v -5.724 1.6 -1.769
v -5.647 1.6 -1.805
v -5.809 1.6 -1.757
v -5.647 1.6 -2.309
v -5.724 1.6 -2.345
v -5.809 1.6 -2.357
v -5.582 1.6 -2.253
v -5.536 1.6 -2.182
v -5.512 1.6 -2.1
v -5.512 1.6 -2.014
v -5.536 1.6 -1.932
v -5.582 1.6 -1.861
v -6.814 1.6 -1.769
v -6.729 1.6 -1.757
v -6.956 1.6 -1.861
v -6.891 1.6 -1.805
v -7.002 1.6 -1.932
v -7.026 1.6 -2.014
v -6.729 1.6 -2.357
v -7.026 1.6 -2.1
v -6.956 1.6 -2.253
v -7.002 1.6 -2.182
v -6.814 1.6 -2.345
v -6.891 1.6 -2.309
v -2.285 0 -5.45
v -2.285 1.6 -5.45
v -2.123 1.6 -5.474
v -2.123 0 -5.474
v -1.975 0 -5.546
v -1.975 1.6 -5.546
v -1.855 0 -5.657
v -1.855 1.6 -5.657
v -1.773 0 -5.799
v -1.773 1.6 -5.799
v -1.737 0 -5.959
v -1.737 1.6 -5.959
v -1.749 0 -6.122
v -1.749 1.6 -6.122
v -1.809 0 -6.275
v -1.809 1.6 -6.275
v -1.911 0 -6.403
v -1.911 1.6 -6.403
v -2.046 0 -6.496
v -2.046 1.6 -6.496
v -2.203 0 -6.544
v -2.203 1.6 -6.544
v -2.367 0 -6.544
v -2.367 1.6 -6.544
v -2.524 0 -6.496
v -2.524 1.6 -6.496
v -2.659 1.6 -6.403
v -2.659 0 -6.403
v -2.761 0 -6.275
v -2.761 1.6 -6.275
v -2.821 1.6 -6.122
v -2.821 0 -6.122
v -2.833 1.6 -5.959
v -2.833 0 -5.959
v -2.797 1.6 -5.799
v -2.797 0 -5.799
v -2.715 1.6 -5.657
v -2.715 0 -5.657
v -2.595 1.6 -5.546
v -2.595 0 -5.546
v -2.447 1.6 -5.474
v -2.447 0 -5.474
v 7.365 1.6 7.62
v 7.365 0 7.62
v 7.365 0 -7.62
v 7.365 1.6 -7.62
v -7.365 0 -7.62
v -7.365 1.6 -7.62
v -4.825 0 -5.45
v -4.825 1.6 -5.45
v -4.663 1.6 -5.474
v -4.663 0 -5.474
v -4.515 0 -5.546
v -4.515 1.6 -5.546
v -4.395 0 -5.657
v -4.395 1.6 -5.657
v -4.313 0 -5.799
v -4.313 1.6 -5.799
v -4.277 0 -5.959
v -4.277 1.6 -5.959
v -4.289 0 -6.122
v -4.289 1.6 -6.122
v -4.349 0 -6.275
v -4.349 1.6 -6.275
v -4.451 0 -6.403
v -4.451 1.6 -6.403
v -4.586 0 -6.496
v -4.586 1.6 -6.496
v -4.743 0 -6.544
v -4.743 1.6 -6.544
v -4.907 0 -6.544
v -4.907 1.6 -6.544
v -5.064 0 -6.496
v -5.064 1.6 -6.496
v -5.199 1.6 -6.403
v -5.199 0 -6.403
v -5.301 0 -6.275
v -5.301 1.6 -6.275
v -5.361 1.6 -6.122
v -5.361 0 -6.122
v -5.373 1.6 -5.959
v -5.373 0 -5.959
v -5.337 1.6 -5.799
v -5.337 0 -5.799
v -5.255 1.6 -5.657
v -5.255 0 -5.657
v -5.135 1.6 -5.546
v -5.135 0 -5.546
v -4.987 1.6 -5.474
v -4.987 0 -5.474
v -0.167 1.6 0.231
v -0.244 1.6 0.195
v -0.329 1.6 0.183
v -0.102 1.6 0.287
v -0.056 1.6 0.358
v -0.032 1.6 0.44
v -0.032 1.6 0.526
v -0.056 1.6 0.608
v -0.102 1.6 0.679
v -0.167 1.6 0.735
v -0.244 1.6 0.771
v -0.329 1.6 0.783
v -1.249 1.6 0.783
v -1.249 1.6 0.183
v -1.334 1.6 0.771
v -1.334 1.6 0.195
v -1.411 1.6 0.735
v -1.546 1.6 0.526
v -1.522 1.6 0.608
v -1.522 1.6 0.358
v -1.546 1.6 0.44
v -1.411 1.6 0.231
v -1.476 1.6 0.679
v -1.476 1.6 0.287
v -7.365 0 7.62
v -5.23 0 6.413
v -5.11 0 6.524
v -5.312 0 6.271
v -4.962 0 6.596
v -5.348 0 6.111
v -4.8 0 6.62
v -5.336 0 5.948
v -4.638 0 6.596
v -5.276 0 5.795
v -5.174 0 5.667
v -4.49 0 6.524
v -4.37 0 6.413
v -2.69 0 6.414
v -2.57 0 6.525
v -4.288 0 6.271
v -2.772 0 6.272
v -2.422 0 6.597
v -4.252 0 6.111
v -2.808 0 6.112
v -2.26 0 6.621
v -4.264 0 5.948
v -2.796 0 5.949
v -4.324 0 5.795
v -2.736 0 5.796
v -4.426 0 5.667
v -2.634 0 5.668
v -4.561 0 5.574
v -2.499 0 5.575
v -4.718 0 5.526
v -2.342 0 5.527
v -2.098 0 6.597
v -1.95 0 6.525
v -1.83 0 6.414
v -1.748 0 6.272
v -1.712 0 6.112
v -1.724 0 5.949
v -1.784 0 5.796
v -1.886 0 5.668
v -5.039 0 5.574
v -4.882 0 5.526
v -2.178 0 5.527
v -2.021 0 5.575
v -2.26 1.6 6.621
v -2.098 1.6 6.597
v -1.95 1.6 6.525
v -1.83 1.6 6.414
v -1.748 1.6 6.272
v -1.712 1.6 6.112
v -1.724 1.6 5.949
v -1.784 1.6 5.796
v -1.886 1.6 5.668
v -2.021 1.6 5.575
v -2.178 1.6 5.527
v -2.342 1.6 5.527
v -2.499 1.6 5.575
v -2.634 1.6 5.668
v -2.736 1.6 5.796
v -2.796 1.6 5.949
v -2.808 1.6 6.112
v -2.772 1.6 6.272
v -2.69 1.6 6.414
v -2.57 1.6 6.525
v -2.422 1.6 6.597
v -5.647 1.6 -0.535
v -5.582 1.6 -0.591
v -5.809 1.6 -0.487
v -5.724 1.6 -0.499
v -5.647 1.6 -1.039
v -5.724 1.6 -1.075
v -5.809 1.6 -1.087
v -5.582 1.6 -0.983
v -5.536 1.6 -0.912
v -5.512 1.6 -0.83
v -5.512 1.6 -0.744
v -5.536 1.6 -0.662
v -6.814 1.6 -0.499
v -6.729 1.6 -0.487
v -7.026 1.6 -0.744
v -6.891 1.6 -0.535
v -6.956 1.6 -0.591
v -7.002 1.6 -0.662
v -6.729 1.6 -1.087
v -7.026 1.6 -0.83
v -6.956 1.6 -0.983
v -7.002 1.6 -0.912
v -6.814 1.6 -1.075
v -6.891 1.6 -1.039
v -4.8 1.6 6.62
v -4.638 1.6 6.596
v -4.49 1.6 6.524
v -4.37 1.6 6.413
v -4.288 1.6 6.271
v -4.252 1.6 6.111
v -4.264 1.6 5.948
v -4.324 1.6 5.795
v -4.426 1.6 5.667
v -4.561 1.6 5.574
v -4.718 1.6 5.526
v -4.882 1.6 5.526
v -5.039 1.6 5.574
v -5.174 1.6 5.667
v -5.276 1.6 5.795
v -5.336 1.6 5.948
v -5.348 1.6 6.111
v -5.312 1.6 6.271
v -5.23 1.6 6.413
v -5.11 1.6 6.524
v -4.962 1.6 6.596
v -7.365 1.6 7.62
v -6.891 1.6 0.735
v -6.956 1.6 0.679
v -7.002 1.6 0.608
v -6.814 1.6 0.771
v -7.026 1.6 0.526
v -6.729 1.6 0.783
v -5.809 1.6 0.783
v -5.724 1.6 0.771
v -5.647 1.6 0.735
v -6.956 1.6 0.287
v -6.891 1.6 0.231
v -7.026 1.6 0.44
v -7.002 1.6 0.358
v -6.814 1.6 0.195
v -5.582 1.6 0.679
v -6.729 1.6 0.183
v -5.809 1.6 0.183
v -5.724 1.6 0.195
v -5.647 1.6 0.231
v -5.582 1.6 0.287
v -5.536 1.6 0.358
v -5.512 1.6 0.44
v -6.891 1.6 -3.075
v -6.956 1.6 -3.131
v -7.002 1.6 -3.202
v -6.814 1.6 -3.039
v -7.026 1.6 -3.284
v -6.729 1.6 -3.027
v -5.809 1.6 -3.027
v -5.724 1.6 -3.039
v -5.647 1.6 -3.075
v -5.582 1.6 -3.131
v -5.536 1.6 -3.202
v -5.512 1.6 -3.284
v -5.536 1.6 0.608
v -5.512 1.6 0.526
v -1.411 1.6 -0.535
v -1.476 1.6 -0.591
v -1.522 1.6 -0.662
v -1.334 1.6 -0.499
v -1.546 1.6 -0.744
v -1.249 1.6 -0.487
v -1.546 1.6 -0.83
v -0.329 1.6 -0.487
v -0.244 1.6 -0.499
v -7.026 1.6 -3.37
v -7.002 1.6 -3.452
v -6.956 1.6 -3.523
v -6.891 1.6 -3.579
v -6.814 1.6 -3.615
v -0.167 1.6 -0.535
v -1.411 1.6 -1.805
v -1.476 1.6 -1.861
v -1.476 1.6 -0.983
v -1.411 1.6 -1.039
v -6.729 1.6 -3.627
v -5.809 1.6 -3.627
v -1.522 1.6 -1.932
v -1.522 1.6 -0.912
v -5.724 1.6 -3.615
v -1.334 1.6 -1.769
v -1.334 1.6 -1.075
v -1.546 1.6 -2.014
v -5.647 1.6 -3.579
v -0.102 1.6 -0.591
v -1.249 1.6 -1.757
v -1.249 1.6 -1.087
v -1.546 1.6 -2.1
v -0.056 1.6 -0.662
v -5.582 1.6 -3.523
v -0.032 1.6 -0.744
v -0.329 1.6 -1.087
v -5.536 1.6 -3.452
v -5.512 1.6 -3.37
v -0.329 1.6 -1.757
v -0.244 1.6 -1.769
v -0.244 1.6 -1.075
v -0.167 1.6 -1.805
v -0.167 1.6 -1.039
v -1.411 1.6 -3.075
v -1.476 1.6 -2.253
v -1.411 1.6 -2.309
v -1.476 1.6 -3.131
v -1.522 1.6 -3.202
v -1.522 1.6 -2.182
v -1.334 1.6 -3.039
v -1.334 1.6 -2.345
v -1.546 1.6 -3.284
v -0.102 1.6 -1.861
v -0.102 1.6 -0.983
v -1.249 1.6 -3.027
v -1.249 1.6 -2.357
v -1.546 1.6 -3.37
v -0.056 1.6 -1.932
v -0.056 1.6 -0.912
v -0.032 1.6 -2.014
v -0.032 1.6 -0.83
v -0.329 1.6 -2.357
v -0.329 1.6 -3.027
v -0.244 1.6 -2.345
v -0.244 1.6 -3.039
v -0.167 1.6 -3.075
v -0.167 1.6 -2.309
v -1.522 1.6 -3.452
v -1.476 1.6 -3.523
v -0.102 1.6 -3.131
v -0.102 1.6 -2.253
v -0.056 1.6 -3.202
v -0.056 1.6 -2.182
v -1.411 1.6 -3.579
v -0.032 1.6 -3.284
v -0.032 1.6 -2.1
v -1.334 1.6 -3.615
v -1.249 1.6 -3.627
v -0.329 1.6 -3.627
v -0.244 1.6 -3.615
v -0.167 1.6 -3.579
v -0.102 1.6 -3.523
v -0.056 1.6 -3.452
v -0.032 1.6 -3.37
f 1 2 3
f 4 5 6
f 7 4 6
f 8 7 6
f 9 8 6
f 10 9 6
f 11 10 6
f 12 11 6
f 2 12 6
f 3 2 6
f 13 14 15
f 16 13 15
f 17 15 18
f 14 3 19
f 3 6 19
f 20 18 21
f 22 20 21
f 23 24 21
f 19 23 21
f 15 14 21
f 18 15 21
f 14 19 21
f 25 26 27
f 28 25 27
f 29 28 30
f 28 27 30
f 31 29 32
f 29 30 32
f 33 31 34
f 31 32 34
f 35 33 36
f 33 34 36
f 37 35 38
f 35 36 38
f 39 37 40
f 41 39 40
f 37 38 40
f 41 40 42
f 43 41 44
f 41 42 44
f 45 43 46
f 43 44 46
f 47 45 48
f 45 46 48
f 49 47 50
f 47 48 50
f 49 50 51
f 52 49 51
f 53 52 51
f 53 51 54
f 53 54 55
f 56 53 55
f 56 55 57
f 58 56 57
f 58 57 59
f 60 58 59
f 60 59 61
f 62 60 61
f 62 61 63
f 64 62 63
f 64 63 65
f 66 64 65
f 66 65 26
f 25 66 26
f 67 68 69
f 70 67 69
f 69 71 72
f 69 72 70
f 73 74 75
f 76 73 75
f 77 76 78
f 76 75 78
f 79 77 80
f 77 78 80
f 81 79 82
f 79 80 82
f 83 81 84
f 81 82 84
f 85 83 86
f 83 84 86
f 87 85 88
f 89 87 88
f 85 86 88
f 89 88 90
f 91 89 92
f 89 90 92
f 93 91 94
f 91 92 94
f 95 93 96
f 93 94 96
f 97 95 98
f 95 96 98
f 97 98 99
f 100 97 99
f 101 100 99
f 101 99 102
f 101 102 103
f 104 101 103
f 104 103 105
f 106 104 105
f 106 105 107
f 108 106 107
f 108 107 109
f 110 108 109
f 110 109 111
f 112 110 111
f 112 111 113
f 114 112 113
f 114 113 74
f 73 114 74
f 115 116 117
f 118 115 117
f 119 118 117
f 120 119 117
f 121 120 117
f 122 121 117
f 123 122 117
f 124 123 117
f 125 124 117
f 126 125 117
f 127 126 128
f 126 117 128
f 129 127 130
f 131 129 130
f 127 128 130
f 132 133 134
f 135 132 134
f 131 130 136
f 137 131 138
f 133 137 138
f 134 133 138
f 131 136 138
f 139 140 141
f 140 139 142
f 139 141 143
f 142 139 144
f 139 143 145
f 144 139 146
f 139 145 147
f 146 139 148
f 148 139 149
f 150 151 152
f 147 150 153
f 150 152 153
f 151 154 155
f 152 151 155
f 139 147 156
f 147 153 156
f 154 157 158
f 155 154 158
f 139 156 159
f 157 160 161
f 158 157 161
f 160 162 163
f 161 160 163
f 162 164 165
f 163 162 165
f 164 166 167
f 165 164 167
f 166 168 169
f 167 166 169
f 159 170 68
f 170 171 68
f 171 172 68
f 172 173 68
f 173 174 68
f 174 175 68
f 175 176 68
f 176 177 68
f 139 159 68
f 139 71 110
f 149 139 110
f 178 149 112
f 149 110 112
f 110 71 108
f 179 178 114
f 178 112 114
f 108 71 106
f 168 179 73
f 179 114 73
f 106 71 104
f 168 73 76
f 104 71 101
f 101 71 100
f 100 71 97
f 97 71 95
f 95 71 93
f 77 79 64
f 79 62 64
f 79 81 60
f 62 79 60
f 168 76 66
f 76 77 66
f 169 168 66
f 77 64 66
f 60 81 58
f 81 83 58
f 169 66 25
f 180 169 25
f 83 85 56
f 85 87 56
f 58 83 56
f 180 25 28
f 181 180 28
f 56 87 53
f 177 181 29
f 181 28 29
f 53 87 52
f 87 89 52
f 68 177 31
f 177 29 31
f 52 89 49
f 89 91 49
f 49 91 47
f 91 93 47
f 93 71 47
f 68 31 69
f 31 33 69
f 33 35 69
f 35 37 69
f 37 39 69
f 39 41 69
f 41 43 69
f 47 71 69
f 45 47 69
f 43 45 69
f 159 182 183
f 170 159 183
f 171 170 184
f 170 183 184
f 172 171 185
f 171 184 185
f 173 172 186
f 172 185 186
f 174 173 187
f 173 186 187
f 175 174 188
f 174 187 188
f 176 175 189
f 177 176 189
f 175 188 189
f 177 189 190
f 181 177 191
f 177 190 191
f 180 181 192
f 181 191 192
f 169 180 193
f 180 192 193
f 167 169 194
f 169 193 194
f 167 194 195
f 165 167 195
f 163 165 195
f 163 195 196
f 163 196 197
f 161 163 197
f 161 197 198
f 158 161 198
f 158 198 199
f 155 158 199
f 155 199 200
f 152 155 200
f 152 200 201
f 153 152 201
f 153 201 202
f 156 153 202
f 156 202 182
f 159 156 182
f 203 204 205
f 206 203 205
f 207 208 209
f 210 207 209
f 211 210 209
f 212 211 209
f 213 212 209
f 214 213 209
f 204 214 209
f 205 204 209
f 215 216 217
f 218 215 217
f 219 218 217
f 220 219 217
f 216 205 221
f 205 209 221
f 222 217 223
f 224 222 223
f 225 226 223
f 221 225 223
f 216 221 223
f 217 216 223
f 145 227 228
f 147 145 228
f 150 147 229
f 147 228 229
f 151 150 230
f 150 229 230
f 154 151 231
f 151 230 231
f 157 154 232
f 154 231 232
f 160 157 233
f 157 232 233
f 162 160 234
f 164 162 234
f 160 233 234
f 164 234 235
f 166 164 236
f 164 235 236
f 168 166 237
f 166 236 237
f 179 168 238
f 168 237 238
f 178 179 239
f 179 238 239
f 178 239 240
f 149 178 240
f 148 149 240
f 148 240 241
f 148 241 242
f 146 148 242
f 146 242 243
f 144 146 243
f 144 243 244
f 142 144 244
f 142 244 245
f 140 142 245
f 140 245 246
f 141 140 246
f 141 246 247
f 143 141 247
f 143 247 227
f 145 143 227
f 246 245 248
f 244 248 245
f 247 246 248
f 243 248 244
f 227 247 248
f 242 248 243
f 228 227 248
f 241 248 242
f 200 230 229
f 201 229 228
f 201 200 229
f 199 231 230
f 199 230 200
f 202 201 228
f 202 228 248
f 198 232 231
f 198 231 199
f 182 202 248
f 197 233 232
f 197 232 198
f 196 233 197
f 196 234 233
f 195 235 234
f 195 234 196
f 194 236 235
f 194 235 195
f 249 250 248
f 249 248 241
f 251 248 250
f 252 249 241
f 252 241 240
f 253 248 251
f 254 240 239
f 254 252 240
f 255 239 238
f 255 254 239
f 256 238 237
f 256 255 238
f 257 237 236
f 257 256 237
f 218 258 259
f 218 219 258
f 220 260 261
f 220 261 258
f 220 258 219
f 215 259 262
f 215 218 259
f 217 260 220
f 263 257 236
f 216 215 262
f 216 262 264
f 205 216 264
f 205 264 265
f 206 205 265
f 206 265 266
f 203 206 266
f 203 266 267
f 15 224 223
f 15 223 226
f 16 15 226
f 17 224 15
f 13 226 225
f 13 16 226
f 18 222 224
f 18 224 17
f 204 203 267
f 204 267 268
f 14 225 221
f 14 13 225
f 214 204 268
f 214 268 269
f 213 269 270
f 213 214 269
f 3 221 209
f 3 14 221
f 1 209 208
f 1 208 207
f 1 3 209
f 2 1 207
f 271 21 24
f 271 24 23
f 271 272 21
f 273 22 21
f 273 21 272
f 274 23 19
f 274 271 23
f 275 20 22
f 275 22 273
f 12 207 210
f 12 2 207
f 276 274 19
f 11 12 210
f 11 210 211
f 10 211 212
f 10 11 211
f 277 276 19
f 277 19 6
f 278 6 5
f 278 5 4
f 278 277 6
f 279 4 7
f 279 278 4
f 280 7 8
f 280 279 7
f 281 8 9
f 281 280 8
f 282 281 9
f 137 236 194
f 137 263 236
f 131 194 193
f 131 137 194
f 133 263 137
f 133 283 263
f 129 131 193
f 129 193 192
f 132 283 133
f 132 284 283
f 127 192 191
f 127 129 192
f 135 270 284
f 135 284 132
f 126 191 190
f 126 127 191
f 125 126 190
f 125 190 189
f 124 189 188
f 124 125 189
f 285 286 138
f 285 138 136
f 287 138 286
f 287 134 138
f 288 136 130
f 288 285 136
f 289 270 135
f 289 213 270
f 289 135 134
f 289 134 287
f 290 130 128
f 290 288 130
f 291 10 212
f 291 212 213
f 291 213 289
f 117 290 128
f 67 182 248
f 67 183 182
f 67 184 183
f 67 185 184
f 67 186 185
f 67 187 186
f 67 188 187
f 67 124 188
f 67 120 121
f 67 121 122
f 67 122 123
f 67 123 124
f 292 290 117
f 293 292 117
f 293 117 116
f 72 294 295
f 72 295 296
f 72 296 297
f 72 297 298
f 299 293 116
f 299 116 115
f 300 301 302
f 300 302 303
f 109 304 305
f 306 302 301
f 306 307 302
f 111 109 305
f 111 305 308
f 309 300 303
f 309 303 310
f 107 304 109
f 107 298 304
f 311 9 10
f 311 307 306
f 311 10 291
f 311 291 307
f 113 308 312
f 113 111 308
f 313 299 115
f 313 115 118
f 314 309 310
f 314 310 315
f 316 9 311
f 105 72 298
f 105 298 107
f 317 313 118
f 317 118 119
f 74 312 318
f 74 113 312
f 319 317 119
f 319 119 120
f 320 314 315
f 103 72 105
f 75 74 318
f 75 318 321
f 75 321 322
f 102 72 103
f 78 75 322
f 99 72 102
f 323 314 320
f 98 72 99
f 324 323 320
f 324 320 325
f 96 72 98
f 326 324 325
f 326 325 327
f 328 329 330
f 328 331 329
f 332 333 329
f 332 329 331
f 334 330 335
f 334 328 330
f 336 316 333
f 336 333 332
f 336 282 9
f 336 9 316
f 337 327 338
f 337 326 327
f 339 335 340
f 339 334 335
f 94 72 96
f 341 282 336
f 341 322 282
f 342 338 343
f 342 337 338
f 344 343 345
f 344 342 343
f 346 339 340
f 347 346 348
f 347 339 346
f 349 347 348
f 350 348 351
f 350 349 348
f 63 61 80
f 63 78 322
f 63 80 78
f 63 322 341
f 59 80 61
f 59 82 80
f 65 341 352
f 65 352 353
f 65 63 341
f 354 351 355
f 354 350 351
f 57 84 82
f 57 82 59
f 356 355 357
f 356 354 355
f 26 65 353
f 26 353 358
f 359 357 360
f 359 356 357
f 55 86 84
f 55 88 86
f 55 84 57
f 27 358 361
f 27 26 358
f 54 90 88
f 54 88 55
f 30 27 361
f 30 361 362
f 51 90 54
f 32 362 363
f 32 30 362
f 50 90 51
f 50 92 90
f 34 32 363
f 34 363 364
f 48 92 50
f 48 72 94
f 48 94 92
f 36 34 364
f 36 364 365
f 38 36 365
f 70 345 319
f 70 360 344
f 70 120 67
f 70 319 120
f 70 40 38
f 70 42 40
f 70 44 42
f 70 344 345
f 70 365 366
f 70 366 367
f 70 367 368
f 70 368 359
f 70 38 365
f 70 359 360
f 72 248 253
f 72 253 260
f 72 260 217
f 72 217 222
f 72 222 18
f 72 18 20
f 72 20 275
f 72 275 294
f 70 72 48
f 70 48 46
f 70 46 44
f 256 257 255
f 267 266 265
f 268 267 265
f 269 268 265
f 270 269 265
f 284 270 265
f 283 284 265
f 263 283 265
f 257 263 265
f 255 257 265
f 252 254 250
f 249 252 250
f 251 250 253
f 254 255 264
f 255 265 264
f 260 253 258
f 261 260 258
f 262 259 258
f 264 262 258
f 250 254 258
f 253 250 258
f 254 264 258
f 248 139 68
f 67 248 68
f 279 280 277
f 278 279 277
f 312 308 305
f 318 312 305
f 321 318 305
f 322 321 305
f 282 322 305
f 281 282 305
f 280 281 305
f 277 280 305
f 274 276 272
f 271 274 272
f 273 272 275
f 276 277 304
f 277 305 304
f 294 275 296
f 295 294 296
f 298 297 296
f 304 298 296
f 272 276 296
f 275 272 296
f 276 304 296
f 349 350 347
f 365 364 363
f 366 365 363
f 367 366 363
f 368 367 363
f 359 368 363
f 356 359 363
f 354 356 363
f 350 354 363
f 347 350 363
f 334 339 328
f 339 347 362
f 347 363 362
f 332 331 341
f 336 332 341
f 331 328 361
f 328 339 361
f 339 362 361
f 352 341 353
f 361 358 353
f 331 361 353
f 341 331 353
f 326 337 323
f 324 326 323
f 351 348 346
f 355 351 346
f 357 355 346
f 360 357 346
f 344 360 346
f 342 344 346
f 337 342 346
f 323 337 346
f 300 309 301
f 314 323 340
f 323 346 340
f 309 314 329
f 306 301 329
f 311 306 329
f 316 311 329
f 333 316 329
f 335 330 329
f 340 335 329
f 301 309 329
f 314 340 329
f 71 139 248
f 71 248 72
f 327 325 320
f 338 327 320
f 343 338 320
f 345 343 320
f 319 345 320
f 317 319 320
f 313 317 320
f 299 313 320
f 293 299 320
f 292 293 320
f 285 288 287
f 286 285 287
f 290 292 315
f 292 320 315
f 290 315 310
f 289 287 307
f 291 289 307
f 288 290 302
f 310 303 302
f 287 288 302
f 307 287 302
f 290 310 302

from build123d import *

# Parameters (mm, degrees)
SKETCH_1_W          = 14.73
SKETCH_1_H          = 15.24
EXTRUDE_1_DEPTH     = 1.6
SKETCH_2_R          = 0.55
CUT_EXTRUDE_1_DEPTH = 11.717631501
CUT_EXTRUDE_2_DEPTH = 0.0001


with BuildPart() as part:
    # Эскиз1 → Бобышка-Вытянуть1 (new body)
    with BuildSketch(Plane(origin=(0, 0, 0), x_dir=(1, 0, 0), z_dir=(0, 1, 0))):
        Rectangle(SKETCH_1_W, SKETCH_1_H)
    extrude(amount=EXTRUDE_1_DEPTH)

    # Эскиз2 → Вырез-Вытянуть1 (cut, through all)
    with BuildSketch(Plane(origin=(0, 1.6, 0), x_dir=(1, 0, 0), z_dir=(0, 1, 0))):
        with Locations(Location((-4.825, 6, 0), (0, 0, 270))):
            Circle(SKETCH_2_R)
        with Locations(Location((-2.285, 6, 0), (0, 0, 270))):
            Circle(SKETCH_2_R)
        with Locations(Location((-4.8, -6.07, 0), (0, 0, 270))):
            Circle(SKETCH_2_R)
        with Locations(Location((-2.260000197, -6.071, 0), (0, 0, 270))):
            Circle(SKETCH_2_R)
    extrude(amount=-CUT_EXTRUDE_1_DEPTH, mode=Mode.SUBTRACT)

    # Эскиз3 → Вырез-Вытянуть2 (cut)
    with BuildSketch(Plane(origin=(0, 1.6, 0), x_dir=(1, 0, 0), z_dir=(0, 1, 0))):
        with BuildLine():
            Line((-6.729, 3.627), (-5.809, 3.627))
            ThreePointArc((-5.809, 3.627), (-5.509, 3.327), (-5.809, 3.027))
            Line((-5.809, 3.027), (-6.729, 3.027))
            ThreePointArc((-6.729, 3.027), (-7.029, 3.327), (-6.729, 3.627))
        make_face()
        with BuildLine():
            Line((-6.729, 2.357), (-5.809, 2.357))
            ThreePointArc((-5.809, 2.357), (-5.509, 2.057), (-5.809, 1.757))
            Line((-5.809, 1.757), (-6.729, 1.757))
            ThreePointArc((-6.729, 1.757), (-7.029, 2.057), (-6.729, 2.357))
        make_face()
        with BuildLine():
            Line((-6.729, 1.087), (-5.809, 1.087))
            ThreePointArc((-5.809, 1.087), (-5.509, 0.787), (-5.809, 0.487))
            Line((-5.809, 0.487), (-6.729, 0.487))
            ThreePointArc((-6.729, 0.487), (-7.029, 0.787), (-6.729, 1.087))
        make_face()
        with BuildLine():
            Line((-6.729, -0.183), (-5.809, -0.183))
            ThreePointArc((-5.809, -0.183), (-5.509, -0.483), (-5.809, -0.783))
            Line((-5.809, -0.783), (-6.729, -0.783))
            ThreePointArc((-6.729, -0.783), (-7.029, -0.483), (-6.729, -0.183))
        make_face()
        with BuildLine():
            Line((-1.249, 2.357), (-0.329, 2.357))
            ThreePointArc((-0.329, 2.357), (-0.029, 2.057), (-0.329, 1.757))
            Line((-0.329, 1.757), (-1.249, 1.757))
            ThreePointArc((-1.249, 1.757), (-1.549, 2.057), (-1.249, 2.357))
        make_face()
        with BuildLine():
            Line((-1.249, 1.087), (-0.329, 1.087))
            ThreePointArc((-0.329, 1.087), (-0.029, 0.787), (-0.329, 0.487))
            Line((-0.329, 0.487), (-1.249, 0.487))
            ThreePointArc((-1.249, 0.487), (-1.549, 0.787), (-1.249, 1.087))
        make_face()
        with BuildLine():
            Line((-1.249, -0.183), (-0.329, -0.183))
            ThreePointArc((-0.329, -0.183), (-0.029, -0.483), (-0.329, -0.783))
            Line((-0.329, -0.783), (-1.249, -0.783))
            ThreePointArc((-1.249, -0.783), (-1.549, -0.483), (-1.249, -0.183))
        make_face()
        with BuildLine():
            Line((-1.249, 3.627), (-0.329, 3.627))
            ThreePointArc((-0.329, 3.627), (-0.029, 3.327), (-0.329, 3.027))
            Line((-0.329, 3.027), (-1.249, 3.027))
            ThreePointArc((-1.249, 3.027), (-1.549, 3.327), (-1.249, 3.627))
        make_face()
    extrude(amount=-CUT_EXTRUDE_2_DEPTH, mode=Mode.SUBTRACT)


solid = part.part
